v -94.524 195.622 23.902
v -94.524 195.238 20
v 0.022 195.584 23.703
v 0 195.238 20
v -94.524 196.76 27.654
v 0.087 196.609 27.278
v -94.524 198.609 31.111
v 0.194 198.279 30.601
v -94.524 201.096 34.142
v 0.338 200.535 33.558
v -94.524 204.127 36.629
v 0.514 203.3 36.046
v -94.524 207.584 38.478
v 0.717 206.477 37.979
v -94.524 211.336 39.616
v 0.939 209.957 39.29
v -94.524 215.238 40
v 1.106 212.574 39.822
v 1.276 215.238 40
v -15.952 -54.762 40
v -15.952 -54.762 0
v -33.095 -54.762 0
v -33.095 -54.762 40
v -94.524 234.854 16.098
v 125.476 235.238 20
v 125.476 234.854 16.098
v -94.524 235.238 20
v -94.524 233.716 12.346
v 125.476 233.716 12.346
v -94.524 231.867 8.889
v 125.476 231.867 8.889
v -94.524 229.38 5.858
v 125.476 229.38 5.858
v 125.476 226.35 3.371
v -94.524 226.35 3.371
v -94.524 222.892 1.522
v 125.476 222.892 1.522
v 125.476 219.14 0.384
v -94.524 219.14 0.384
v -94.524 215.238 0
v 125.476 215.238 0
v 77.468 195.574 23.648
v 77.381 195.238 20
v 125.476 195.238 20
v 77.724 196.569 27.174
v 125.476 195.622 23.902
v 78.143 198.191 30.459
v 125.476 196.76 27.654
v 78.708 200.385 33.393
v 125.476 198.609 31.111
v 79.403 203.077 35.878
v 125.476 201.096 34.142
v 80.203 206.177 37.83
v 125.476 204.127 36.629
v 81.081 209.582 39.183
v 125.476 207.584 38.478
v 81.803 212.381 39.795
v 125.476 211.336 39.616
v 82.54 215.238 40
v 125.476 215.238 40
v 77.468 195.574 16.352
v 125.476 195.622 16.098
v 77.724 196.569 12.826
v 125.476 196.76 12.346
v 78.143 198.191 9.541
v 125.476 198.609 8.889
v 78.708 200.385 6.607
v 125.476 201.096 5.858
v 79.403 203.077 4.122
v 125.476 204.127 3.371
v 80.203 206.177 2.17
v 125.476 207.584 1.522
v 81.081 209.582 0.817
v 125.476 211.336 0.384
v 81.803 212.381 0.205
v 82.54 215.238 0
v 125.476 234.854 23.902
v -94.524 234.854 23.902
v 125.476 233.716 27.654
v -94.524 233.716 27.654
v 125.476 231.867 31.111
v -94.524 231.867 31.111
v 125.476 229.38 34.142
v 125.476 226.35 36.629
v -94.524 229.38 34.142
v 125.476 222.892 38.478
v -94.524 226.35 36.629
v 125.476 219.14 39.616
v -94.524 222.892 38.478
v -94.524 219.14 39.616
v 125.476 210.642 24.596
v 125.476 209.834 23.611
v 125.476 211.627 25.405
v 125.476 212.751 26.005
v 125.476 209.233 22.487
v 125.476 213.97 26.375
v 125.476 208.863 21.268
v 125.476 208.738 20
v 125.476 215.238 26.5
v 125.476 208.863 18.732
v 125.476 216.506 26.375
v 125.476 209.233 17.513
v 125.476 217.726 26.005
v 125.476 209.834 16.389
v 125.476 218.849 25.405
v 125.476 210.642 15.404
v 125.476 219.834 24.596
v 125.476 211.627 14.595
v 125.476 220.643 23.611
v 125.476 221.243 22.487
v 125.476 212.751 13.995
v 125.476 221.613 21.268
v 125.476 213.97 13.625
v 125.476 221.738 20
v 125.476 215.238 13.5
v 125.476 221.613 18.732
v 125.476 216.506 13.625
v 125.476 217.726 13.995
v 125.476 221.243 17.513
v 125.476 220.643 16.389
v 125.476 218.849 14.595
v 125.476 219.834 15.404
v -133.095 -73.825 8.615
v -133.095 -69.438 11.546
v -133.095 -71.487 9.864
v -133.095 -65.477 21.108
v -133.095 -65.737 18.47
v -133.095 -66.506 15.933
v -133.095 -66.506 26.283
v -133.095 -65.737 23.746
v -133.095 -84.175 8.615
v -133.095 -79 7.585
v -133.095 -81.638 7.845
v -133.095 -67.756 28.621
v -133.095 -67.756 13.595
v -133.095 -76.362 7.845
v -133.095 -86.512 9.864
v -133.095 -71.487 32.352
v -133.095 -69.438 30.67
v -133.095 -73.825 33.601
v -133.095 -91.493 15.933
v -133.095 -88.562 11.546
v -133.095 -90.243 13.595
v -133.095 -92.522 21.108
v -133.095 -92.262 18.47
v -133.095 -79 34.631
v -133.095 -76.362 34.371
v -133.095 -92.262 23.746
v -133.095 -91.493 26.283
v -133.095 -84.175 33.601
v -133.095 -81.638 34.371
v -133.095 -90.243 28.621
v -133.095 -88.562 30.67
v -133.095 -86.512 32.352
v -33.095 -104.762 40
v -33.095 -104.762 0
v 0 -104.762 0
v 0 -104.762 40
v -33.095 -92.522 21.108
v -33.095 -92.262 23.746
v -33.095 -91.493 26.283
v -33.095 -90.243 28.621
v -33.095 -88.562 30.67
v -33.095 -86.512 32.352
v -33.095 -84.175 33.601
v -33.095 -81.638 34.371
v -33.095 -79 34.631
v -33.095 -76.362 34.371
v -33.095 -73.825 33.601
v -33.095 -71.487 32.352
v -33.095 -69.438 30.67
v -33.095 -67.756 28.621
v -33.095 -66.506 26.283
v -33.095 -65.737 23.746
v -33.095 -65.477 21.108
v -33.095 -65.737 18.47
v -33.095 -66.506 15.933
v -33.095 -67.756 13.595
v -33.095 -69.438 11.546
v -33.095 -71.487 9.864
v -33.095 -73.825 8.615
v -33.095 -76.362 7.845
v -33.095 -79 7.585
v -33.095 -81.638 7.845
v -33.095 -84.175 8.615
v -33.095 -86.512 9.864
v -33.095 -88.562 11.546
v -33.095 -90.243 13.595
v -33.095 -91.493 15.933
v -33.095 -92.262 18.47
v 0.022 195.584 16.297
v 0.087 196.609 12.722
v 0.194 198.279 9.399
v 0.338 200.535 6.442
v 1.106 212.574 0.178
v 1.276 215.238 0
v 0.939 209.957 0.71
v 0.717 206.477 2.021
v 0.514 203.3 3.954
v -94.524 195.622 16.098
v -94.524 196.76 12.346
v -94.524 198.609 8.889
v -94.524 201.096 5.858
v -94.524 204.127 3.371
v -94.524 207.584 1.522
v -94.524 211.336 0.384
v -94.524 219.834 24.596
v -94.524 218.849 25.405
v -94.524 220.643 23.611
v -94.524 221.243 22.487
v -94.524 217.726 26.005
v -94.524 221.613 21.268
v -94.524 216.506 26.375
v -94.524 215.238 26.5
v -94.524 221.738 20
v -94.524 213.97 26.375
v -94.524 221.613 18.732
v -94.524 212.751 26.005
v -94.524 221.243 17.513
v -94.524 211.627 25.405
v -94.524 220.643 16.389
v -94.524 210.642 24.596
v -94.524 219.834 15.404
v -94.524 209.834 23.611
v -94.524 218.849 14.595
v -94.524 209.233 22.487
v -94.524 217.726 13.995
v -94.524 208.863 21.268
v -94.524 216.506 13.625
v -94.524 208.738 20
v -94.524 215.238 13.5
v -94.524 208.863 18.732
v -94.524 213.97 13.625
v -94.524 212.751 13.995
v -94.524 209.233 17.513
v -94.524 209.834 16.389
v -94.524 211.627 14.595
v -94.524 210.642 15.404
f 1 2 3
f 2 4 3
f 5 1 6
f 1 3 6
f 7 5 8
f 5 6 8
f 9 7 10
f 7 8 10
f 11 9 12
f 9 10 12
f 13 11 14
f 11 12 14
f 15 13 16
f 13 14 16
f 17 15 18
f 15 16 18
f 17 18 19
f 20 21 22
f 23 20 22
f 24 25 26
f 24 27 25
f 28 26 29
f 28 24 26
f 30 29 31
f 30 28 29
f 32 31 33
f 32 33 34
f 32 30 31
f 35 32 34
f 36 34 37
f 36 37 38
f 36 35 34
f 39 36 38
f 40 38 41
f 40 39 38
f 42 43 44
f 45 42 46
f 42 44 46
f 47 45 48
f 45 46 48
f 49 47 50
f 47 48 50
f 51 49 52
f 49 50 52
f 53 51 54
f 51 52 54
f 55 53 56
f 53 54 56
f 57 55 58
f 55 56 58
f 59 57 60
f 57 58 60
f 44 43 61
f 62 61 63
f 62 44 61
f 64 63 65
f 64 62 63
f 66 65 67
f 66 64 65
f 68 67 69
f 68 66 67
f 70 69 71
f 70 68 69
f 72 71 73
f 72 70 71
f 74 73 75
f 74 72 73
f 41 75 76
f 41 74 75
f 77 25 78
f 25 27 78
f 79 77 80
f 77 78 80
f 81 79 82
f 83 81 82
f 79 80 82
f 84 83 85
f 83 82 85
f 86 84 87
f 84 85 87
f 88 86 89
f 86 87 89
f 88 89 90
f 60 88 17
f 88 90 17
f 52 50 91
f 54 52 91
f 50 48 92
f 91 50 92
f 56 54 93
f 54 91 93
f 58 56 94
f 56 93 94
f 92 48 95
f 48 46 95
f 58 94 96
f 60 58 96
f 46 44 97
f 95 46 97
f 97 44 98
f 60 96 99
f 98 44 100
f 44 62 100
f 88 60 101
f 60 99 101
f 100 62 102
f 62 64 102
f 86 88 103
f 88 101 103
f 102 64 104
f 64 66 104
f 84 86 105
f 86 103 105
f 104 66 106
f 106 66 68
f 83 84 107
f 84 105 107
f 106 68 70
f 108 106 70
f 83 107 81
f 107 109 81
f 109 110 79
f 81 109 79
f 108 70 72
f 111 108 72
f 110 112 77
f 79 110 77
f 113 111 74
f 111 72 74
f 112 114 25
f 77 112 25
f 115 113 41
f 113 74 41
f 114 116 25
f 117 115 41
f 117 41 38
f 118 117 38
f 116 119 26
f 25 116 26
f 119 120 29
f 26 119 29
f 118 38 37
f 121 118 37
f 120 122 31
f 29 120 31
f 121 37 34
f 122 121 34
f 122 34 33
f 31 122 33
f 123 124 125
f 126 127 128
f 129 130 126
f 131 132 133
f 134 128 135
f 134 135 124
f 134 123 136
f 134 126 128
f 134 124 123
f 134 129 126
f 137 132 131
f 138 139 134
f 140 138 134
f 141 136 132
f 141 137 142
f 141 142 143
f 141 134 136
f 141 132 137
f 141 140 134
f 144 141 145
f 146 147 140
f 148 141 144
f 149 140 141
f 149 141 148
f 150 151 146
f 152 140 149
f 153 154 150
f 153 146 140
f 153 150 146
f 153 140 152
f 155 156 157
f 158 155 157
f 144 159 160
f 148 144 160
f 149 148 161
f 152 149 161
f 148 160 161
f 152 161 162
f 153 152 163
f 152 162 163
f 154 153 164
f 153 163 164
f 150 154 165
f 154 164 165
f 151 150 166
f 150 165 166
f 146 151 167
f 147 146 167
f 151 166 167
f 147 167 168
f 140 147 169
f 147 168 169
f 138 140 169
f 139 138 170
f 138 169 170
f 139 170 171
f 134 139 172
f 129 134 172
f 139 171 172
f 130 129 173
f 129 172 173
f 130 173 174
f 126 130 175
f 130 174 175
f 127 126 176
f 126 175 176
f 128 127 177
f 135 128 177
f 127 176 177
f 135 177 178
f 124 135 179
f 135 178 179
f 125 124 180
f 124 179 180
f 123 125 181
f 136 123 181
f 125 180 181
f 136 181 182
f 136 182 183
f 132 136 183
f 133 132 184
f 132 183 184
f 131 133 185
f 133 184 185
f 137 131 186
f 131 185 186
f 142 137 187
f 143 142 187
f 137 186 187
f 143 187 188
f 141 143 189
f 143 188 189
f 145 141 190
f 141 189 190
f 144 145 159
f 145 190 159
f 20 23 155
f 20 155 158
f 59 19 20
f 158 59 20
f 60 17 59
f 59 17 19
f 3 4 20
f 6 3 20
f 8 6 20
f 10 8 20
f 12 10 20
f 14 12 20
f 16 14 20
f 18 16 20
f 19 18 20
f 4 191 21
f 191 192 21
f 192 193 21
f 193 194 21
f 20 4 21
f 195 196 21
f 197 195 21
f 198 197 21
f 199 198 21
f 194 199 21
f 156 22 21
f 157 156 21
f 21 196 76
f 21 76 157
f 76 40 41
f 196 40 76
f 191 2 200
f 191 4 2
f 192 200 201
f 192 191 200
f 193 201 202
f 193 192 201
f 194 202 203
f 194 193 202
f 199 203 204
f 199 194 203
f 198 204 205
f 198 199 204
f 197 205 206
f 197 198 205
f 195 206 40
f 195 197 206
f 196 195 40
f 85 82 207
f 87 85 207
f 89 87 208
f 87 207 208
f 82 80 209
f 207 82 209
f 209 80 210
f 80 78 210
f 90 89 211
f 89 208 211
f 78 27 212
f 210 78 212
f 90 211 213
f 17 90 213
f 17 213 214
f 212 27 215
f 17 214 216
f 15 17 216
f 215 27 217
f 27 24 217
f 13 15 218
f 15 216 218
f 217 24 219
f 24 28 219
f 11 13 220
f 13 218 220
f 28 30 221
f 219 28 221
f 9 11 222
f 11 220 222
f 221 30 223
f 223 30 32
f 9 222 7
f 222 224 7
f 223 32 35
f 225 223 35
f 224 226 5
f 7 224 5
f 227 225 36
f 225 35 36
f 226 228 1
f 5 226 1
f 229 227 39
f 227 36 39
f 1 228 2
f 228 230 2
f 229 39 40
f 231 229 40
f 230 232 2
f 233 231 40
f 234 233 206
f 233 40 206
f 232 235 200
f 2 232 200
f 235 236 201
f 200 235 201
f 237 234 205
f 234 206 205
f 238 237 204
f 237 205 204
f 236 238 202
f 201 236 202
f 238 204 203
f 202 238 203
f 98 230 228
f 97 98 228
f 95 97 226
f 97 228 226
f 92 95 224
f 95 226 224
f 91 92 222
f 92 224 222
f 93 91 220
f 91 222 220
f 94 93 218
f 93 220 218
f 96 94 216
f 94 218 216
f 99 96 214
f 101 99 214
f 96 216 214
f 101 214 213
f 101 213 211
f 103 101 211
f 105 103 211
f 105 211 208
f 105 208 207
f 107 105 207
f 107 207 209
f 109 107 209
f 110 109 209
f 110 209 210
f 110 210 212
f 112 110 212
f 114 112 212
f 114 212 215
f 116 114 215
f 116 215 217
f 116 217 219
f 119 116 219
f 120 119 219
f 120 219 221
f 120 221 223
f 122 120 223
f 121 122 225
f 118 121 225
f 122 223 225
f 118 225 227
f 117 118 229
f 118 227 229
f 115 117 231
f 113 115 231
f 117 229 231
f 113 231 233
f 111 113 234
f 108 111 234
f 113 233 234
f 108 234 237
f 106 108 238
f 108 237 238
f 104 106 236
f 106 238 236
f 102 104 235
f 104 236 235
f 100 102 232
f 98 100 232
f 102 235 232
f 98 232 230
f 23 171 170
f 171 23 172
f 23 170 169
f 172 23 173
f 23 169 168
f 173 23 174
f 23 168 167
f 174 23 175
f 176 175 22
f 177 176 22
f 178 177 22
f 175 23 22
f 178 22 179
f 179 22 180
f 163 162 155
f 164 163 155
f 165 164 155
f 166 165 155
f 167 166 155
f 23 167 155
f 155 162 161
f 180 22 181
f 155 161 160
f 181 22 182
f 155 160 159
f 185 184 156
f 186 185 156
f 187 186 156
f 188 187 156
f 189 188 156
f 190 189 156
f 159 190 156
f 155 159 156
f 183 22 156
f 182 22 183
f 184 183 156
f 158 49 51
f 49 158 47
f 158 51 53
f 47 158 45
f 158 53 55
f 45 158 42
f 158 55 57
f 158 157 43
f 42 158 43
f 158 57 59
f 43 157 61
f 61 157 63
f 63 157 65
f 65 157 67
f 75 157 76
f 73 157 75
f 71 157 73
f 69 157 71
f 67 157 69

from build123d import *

# Parameters (mm, degrees)
F1_DEPTH = 40
F2_R     = 19.99999
F3_R     = 6.5
F4_DEPTH = 220.001
F5_R     = 13.52259159
F6_DEPTH = 100


# Not quite as in the source:
# - a fillet or chamfer is up to 0.001 mm smaller than in the source, because OpenCascade refuses the exact size


with BuildPart() as f1:
    # F0 (on Top) → F1 (new body)
    with BuildSketch(Plane.XY):
        Polygon((125.4761886686, 235.2380912917), (-94.5238113314, 235.2380912917), (-94.5238113314, 195.2380912917), (0, 195.2380912917), (-15.9523813939, -54.7619087083), (-33.0952398201, -54.7619087083), (-33.0952398201, -104.7619087083), (0, -104.7619087083), (77.3809560928, 195.2380912917), (125.4761886686, 195.2380912917), align=None)
    extrude(amount=F1_DEPTH)

    # F2 (radius 20 in the source; OpenCascade refuses exactly that, so slightly less here)
    f2_edges = [f1.edges().sort_by_distance(p)[0] for p in [
        (15.476189, 235.238091, 40),
        (15.476189, 235.238091, 0),
        (-47.261906, 195.238091, 0),
        (-47.261906, 195.238091, 40),
        (101.428572, 195.238091, 0),
        (101.428572, 195.238091, 40),
    ]]
    fillet(f2_edges, radius=F2_R)

    # F3 (on face) → F4 (cut, through all)
    with BuildSketch(Plane(origin=(-94.5238113314, 0, 0), x_dir=(0, -1, 0), z_dir=(-1, 0, 0))):
        with Locations((-215.2380912917, 20)):
            Circle(F3_R)
    extrude(amount=-F4_DEPTH, mode=Mode.SUBTRACT)

    # F5 (on face) → F6 (join)
    with BuildSketch(Plane(origin=(-33.0952398201, 0, 0), x_dir=(0, -1, 0), z_dir=(-1, 0, 0))):
        with Locations((78.9996907115, 21.1079698056)):
            Circle(F5_R)
    extrude(amount=F6_DEPTH)


solid = f1.part
